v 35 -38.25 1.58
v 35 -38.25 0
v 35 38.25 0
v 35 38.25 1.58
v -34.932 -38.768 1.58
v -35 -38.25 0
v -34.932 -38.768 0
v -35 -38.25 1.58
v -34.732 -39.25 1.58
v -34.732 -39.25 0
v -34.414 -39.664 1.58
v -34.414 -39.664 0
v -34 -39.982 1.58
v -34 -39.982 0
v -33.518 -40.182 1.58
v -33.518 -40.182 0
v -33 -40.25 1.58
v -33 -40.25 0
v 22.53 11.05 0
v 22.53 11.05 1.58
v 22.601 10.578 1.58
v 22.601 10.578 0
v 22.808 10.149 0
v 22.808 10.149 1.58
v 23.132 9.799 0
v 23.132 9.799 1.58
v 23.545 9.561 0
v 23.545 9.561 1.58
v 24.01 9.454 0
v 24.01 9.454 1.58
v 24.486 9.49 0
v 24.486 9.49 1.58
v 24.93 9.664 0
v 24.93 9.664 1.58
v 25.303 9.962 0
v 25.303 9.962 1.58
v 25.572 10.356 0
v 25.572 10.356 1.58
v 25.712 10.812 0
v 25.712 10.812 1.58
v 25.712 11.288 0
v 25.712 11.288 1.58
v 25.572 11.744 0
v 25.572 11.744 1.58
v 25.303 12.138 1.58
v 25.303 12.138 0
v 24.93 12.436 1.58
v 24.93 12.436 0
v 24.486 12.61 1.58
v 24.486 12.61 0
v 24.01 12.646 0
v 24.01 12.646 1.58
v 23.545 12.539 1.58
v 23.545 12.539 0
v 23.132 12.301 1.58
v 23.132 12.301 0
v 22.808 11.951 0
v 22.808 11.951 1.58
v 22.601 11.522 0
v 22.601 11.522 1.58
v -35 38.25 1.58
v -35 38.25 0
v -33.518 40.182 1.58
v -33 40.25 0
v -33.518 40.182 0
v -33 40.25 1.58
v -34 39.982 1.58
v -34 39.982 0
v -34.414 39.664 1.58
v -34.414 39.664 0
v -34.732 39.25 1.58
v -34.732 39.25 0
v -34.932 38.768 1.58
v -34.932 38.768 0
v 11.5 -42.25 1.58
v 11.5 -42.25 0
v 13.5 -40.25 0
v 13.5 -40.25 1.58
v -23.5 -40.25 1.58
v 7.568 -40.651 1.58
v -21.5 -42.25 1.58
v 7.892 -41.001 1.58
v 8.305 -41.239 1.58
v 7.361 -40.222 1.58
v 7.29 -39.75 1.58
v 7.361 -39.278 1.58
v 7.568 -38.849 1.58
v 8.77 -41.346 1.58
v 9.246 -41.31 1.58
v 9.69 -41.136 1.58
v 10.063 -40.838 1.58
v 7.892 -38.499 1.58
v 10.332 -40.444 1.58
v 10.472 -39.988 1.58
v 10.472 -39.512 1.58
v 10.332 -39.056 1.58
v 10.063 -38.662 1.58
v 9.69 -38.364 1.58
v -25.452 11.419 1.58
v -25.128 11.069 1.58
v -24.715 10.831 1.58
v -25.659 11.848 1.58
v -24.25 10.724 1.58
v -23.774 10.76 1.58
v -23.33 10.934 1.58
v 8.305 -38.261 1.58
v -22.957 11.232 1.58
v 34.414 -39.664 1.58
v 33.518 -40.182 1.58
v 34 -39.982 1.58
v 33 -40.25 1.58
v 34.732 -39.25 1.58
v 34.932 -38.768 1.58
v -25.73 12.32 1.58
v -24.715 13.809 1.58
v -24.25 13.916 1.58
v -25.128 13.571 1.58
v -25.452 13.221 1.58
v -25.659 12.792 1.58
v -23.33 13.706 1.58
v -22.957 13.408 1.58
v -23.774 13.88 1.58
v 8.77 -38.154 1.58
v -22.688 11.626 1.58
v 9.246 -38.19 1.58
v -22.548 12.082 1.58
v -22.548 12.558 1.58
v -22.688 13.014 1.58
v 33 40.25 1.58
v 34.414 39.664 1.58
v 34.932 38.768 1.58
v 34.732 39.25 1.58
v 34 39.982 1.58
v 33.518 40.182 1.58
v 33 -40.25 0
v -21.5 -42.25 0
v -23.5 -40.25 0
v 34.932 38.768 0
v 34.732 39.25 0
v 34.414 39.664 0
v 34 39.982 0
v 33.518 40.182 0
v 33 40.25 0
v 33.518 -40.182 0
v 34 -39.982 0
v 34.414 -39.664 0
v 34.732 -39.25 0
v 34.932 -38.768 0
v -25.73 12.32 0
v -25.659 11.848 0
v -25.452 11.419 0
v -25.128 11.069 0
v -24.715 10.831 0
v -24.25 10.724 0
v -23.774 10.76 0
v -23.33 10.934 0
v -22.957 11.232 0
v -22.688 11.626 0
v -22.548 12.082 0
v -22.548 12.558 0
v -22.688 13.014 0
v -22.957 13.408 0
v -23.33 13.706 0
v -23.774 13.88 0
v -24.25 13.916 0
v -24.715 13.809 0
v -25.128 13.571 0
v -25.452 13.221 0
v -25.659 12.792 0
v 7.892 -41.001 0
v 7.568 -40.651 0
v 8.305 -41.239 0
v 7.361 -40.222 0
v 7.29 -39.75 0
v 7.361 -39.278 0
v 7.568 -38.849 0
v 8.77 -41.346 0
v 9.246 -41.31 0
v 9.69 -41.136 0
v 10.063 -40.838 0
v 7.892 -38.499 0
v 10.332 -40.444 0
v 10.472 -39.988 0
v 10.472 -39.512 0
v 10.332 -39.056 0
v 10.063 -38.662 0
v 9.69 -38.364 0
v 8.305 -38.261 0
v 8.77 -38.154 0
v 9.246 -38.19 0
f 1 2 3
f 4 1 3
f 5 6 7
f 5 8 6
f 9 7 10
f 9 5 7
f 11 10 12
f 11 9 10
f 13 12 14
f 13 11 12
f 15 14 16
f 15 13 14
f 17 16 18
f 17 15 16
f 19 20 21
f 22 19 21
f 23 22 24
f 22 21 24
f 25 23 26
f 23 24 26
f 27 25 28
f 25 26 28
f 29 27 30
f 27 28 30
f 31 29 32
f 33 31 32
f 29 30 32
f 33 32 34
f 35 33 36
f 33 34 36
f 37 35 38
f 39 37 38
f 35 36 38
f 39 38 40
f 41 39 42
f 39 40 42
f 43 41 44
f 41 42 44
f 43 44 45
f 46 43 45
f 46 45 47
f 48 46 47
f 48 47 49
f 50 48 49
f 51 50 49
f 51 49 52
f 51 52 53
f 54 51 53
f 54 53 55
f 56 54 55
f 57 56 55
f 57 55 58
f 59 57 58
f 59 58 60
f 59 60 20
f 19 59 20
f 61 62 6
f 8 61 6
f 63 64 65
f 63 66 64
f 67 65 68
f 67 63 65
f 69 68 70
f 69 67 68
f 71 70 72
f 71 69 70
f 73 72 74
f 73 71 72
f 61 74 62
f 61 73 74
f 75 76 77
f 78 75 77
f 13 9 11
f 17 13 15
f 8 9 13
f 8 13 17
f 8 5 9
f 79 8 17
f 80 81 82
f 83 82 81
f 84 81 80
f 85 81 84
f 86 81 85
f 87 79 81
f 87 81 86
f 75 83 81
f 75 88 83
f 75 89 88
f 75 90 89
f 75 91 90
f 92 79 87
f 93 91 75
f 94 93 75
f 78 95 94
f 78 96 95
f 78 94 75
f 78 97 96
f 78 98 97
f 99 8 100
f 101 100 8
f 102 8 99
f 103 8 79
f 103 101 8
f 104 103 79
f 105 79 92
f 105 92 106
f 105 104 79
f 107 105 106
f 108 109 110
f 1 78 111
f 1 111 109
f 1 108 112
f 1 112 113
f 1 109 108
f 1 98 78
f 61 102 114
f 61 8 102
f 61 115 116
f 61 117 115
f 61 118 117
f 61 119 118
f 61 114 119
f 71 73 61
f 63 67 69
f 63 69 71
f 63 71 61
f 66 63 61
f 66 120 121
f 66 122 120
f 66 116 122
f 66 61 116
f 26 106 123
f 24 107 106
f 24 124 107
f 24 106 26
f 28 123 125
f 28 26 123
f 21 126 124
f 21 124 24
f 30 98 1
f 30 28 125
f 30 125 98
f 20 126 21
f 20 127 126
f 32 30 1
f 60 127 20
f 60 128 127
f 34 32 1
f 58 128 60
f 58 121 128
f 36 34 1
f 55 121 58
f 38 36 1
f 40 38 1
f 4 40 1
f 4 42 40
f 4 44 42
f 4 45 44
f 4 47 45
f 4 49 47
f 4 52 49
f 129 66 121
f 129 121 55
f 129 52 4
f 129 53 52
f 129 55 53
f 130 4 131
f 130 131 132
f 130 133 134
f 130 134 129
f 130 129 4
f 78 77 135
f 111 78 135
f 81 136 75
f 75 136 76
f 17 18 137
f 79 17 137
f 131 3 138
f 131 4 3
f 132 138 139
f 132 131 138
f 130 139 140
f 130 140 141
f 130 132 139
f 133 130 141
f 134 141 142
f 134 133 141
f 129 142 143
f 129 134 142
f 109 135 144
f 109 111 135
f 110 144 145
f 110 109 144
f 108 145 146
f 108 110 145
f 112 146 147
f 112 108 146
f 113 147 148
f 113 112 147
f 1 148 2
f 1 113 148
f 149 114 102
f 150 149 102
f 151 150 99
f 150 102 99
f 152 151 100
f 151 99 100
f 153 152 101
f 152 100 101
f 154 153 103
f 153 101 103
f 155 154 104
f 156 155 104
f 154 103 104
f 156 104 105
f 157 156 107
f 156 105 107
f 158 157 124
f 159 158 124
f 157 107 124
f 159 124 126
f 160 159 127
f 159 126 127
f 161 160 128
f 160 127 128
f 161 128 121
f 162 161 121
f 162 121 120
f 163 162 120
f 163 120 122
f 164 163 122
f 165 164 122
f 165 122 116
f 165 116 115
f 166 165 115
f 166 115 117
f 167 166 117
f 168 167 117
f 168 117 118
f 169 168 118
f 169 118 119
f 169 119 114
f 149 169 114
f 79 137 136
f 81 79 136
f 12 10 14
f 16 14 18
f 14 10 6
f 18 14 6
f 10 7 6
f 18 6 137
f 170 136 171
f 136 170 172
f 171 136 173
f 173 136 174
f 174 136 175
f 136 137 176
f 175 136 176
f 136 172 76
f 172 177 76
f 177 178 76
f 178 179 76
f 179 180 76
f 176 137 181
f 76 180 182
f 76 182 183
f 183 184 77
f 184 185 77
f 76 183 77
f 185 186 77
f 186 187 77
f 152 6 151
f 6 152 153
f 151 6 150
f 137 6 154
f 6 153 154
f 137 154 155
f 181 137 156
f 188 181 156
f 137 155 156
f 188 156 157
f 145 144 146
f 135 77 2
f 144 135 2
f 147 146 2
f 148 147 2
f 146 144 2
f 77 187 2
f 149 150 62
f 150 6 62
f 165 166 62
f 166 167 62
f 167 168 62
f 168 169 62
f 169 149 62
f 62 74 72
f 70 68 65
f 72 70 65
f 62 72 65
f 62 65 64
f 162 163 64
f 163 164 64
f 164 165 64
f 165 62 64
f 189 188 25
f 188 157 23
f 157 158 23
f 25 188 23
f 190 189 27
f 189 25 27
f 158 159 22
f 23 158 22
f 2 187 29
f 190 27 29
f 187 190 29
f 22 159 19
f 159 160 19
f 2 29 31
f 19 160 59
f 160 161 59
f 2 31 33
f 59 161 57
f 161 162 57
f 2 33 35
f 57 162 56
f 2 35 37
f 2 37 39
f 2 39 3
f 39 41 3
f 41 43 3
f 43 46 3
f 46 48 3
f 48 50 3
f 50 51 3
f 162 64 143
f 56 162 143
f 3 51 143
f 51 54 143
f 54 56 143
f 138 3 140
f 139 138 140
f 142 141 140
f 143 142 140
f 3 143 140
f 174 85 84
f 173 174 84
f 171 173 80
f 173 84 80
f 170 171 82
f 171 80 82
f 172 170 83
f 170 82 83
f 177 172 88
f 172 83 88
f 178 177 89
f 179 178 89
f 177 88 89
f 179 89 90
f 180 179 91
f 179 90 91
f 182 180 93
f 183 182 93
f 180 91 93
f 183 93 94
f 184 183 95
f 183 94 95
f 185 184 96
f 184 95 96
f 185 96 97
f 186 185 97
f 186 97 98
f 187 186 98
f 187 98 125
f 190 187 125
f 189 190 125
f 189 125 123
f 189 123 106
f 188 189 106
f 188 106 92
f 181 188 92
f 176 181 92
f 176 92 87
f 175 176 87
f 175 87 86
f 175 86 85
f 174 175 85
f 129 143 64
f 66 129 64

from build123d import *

# Parameters (mm, degrees)
F1_DEPTH = 1.58
F2_R     = 2
F3_D     = 3.2


with BuildPart() as f1:
    # F0 (on Top) → F1 (new body)
    with BuildSketch(Plane.XY):
        Polygon((13.5, -40.25), (35, -40.25), (35, 40.25), (-35, 40.25), (-35, -40.25), (-23.5, -40.25), (-21.5, -42.25), (11.5, -42.25), align=None)
    extrude(amount=F1_DEPTH)

    # F2
    f2_edges = [f1.edges().sort_by_distance(p)[0] for p in [
        (-35, 40.25, 0.79),
        (35, 40.25, 0.79),
        (-35, -40.25, 0.79),
        (35, -40.25, 0.79),
    ]]
    fillet(f2_edges, radius=F2_R)

    # F3 (through all)
    with Locations(Plane(origin=(0, 0, 0), x_dir=(1, 0, 0), z_dir=(0, 0, -1))):
        with Locations((-24.13, -12.32), (24.13, -11.05), (8.89, 39.75)):
            Hole(F3_D / 2)


solid = f1.part
